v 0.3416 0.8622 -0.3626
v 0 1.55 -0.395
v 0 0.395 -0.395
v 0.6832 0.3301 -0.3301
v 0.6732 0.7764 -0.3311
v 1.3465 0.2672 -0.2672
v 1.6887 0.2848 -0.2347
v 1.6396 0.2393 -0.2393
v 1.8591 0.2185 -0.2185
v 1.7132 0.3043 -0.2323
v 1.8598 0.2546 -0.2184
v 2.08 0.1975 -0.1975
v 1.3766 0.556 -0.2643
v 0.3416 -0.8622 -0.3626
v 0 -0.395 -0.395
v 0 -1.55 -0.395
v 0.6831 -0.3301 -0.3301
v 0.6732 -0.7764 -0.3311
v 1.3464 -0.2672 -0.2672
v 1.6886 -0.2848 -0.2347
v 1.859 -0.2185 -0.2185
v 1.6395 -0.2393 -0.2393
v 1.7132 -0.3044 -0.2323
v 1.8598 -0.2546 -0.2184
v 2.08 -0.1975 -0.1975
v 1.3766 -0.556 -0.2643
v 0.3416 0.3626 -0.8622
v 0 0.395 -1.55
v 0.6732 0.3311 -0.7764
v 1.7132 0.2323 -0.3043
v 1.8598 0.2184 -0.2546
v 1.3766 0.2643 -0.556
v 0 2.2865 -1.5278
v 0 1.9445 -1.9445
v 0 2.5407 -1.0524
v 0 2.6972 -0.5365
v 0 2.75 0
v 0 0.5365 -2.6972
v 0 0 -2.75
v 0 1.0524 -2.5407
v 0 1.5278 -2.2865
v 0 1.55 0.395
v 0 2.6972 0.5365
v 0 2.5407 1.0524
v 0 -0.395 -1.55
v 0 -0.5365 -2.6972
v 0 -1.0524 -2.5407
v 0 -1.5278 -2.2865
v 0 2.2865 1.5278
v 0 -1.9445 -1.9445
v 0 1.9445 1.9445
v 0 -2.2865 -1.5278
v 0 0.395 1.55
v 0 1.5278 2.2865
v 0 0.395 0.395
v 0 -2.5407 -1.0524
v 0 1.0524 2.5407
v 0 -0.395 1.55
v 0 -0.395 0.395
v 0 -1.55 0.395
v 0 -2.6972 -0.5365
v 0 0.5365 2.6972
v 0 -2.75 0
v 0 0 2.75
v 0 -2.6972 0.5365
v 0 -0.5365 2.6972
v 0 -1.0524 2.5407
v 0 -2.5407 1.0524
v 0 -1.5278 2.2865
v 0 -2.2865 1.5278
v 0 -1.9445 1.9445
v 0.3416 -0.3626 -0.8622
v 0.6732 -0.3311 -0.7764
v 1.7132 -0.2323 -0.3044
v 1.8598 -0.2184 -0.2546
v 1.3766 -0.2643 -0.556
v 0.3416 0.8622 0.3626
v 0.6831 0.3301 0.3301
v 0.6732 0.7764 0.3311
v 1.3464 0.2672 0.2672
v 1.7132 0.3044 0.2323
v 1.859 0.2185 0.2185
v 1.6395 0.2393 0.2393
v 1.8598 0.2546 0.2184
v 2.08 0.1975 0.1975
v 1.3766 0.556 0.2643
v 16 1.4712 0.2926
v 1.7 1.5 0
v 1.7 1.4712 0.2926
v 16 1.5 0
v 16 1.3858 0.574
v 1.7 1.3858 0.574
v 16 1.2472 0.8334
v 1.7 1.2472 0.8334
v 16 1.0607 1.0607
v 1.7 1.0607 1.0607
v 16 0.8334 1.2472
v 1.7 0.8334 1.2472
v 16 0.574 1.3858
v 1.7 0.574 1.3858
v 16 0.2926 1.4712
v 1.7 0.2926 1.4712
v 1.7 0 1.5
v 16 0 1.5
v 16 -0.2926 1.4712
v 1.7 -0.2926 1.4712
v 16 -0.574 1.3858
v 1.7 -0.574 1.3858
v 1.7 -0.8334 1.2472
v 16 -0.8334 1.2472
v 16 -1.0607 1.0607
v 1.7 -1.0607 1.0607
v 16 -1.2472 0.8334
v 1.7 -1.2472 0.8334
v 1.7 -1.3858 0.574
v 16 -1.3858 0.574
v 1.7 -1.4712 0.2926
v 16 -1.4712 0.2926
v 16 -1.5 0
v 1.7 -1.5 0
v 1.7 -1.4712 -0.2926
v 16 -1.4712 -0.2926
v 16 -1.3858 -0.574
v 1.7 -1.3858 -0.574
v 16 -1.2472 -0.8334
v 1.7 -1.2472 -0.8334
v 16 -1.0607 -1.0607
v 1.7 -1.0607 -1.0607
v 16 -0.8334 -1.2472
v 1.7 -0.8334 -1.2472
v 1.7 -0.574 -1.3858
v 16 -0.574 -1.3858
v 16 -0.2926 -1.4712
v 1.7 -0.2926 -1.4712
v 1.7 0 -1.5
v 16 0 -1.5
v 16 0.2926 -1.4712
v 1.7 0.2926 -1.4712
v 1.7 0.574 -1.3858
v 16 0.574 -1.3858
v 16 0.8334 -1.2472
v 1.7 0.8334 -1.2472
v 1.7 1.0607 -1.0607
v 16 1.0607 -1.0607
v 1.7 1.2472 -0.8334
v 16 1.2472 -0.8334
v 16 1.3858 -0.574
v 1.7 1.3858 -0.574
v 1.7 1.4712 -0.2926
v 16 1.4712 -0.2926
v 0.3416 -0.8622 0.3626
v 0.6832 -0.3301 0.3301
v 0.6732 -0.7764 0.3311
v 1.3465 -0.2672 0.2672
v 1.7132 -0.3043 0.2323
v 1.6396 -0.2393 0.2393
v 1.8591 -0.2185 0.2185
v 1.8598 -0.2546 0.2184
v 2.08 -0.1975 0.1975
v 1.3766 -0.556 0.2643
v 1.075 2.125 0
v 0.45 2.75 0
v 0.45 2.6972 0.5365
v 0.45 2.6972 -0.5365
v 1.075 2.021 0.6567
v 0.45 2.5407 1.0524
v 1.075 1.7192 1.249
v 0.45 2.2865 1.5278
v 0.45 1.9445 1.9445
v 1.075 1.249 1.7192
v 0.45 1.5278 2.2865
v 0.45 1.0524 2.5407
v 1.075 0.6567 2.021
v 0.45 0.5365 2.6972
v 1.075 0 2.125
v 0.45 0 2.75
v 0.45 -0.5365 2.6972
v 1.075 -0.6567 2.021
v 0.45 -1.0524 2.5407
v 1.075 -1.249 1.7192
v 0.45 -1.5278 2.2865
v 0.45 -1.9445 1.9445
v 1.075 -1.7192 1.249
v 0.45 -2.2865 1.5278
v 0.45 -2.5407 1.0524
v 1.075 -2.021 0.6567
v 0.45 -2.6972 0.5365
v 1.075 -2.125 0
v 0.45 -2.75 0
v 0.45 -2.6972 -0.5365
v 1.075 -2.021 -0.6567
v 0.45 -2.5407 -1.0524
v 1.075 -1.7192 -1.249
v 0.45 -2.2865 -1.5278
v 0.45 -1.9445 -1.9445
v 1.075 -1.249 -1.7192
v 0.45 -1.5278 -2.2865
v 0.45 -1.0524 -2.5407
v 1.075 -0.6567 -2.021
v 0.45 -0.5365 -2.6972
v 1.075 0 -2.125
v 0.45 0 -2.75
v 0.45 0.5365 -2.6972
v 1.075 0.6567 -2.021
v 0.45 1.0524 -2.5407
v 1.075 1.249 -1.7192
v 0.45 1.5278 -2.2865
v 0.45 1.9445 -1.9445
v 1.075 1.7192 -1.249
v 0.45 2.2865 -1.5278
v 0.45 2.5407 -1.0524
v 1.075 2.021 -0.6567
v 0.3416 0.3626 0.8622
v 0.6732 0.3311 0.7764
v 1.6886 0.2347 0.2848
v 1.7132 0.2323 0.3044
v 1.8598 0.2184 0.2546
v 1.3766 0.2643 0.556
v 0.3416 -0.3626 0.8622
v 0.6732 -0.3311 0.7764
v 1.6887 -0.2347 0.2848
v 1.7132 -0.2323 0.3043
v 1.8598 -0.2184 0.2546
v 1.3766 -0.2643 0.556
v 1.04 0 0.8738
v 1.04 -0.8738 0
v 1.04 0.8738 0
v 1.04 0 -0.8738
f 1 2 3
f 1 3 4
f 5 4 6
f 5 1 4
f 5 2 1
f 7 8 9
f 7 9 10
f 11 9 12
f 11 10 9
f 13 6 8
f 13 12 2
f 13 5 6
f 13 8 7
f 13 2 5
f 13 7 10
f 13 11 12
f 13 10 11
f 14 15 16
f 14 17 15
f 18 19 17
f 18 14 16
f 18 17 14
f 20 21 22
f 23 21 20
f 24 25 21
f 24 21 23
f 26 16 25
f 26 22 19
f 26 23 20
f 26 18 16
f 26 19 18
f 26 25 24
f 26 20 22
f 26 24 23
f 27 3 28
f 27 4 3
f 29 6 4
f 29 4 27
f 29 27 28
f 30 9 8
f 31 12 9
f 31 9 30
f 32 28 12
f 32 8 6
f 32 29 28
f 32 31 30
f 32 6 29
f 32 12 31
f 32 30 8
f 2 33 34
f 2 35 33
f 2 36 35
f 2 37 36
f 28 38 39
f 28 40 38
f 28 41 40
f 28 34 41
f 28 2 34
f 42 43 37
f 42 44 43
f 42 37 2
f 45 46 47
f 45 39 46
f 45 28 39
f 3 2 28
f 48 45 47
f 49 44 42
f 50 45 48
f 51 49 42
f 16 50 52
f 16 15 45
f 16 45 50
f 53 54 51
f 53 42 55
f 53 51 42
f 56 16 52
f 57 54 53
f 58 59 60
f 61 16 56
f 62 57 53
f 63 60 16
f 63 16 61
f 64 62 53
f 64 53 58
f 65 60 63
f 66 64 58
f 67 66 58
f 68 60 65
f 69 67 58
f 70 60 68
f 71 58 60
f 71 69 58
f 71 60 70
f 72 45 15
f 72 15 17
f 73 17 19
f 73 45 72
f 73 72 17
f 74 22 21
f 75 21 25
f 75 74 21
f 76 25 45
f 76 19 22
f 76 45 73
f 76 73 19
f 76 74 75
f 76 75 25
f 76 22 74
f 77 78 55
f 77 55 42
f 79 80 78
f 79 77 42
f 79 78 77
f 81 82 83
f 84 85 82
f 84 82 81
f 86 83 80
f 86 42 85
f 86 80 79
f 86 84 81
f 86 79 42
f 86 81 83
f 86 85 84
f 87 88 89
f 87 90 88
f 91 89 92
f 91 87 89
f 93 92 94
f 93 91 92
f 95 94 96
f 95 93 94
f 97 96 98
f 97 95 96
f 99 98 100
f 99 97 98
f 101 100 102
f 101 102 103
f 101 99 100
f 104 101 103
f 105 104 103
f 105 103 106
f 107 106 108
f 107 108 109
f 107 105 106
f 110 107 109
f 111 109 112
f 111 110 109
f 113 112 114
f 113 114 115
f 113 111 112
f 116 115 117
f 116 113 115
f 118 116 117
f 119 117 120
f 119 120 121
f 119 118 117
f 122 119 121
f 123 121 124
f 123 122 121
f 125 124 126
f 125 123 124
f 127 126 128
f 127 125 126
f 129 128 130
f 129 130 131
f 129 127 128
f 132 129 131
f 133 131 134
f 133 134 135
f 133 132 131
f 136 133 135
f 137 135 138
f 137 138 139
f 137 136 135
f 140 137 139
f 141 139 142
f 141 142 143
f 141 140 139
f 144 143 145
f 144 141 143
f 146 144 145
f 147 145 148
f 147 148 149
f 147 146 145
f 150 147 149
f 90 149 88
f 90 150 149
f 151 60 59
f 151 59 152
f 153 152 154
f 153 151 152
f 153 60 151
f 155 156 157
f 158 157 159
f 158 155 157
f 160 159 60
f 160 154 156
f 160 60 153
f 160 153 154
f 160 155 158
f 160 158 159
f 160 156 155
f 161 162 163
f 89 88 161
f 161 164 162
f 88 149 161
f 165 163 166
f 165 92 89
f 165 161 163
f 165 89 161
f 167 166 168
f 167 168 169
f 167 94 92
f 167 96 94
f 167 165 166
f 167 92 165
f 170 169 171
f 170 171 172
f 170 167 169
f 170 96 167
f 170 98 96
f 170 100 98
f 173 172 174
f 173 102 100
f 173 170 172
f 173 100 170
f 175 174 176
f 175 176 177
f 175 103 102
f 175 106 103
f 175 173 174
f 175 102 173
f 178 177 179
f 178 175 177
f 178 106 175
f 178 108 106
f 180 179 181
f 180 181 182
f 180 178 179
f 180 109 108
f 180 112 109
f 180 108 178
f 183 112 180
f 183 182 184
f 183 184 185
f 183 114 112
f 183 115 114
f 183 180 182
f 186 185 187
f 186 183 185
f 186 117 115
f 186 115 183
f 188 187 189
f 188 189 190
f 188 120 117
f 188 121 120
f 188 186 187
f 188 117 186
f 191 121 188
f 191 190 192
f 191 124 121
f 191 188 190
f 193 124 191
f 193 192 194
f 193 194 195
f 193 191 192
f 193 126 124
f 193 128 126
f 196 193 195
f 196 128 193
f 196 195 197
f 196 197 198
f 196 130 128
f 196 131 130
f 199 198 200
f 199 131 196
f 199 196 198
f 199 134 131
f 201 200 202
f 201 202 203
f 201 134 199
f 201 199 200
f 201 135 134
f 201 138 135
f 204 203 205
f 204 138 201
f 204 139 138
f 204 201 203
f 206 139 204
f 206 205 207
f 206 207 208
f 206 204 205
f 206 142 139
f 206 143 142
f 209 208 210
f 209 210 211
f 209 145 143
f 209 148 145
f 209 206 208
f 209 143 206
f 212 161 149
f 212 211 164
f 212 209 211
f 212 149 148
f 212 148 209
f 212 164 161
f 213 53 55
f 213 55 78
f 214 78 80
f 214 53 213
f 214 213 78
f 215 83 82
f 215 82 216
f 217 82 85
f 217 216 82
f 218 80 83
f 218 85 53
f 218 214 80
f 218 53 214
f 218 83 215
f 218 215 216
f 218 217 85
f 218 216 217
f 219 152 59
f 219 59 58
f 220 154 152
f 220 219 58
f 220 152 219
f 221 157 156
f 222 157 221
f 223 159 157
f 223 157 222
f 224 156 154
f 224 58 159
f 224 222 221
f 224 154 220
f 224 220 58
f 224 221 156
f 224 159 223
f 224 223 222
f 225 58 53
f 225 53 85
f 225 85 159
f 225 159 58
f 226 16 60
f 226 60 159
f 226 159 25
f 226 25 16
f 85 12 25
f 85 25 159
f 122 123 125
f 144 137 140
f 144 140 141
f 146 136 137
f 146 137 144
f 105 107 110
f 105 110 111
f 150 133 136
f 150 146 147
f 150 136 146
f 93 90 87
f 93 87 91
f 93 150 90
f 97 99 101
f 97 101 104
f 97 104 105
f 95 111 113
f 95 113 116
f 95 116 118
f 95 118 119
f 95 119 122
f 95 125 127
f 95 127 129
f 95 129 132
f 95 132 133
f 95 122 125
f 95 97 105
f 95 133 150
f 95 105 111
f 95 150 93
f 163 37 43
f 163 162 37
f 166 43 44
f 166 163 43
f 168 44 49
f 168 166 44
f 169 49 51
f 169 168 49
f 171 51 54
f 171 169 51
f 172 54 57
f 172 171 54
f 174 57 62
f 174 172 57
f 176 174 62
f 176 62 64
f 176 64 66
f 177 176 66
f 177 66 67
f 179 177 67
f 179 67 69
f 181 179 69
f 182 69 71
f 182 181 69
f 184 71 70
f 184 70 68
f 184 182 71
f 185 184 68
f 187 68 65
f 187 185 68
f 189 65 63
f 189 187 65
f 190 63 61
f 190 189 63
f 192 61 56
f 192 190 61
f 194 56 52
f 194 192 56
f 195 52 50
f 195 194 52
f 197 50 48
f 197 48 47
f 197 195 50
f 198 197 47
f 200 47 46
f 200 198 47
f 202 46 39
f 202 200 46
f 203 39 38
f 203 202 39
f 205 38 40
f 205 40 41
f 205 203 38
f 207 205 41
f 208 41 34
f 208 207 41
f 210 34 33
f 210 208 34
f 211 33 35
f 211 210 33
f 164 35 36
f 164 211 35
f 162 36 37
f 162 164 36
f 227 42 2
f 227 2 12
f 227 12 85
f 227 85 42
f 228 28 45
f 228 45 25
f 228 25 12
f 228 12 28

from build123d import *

# Parameters (mm, degrees)
SKETCH3_W         = 0.79
SKETCH3_H         = 3.1
SKETCH4_W         = 0.395
SKETCH4_H         = 0.395
CIRPATTERN1_COUNT = 2
CIRPATTERN1_ANGLE = 90


with BuildPart() as part:
    # BodySke → Base-Revolve (revolve)
    with BuildSketch(Plane.XY):
        Polygon((0, 0), (0, 2.75), (0.45, 2.75), (1.7, 1.5), (16, 1.5), (16, 0), align=None)
    revolve(axis=Axis((-6.35, 0, 0), (1, 0, 0)))

    # Sketch3 → Cross section 0
    with BuildSketch(Plane.ZY):
        Rectangle(SKETCH3_W, SKETCH3_H)
    # Sketch4 → Cross section 1
    with BuildSketch(Plane.ZY.offset(-2.08)):
        Rectangle(SKETCH4_W, SKETCH4_H)
    cross = loft(mode=Mode.SUBTRACT)

    # CirPattern1: Cross ×2 about axis
    cirpattern1_axis = Axis((0, 0, 0), (1, 0, 0))
    for i in range(1, CIRPATTERN1_COUNT):
        add(cross.rotate(cirpattern1_axis, i * CIRPATTERN1_ANGLE / (CIRPATTERN1_COUNT - 1)), mode=Mode.SUBTRACT)


solid = part.part
